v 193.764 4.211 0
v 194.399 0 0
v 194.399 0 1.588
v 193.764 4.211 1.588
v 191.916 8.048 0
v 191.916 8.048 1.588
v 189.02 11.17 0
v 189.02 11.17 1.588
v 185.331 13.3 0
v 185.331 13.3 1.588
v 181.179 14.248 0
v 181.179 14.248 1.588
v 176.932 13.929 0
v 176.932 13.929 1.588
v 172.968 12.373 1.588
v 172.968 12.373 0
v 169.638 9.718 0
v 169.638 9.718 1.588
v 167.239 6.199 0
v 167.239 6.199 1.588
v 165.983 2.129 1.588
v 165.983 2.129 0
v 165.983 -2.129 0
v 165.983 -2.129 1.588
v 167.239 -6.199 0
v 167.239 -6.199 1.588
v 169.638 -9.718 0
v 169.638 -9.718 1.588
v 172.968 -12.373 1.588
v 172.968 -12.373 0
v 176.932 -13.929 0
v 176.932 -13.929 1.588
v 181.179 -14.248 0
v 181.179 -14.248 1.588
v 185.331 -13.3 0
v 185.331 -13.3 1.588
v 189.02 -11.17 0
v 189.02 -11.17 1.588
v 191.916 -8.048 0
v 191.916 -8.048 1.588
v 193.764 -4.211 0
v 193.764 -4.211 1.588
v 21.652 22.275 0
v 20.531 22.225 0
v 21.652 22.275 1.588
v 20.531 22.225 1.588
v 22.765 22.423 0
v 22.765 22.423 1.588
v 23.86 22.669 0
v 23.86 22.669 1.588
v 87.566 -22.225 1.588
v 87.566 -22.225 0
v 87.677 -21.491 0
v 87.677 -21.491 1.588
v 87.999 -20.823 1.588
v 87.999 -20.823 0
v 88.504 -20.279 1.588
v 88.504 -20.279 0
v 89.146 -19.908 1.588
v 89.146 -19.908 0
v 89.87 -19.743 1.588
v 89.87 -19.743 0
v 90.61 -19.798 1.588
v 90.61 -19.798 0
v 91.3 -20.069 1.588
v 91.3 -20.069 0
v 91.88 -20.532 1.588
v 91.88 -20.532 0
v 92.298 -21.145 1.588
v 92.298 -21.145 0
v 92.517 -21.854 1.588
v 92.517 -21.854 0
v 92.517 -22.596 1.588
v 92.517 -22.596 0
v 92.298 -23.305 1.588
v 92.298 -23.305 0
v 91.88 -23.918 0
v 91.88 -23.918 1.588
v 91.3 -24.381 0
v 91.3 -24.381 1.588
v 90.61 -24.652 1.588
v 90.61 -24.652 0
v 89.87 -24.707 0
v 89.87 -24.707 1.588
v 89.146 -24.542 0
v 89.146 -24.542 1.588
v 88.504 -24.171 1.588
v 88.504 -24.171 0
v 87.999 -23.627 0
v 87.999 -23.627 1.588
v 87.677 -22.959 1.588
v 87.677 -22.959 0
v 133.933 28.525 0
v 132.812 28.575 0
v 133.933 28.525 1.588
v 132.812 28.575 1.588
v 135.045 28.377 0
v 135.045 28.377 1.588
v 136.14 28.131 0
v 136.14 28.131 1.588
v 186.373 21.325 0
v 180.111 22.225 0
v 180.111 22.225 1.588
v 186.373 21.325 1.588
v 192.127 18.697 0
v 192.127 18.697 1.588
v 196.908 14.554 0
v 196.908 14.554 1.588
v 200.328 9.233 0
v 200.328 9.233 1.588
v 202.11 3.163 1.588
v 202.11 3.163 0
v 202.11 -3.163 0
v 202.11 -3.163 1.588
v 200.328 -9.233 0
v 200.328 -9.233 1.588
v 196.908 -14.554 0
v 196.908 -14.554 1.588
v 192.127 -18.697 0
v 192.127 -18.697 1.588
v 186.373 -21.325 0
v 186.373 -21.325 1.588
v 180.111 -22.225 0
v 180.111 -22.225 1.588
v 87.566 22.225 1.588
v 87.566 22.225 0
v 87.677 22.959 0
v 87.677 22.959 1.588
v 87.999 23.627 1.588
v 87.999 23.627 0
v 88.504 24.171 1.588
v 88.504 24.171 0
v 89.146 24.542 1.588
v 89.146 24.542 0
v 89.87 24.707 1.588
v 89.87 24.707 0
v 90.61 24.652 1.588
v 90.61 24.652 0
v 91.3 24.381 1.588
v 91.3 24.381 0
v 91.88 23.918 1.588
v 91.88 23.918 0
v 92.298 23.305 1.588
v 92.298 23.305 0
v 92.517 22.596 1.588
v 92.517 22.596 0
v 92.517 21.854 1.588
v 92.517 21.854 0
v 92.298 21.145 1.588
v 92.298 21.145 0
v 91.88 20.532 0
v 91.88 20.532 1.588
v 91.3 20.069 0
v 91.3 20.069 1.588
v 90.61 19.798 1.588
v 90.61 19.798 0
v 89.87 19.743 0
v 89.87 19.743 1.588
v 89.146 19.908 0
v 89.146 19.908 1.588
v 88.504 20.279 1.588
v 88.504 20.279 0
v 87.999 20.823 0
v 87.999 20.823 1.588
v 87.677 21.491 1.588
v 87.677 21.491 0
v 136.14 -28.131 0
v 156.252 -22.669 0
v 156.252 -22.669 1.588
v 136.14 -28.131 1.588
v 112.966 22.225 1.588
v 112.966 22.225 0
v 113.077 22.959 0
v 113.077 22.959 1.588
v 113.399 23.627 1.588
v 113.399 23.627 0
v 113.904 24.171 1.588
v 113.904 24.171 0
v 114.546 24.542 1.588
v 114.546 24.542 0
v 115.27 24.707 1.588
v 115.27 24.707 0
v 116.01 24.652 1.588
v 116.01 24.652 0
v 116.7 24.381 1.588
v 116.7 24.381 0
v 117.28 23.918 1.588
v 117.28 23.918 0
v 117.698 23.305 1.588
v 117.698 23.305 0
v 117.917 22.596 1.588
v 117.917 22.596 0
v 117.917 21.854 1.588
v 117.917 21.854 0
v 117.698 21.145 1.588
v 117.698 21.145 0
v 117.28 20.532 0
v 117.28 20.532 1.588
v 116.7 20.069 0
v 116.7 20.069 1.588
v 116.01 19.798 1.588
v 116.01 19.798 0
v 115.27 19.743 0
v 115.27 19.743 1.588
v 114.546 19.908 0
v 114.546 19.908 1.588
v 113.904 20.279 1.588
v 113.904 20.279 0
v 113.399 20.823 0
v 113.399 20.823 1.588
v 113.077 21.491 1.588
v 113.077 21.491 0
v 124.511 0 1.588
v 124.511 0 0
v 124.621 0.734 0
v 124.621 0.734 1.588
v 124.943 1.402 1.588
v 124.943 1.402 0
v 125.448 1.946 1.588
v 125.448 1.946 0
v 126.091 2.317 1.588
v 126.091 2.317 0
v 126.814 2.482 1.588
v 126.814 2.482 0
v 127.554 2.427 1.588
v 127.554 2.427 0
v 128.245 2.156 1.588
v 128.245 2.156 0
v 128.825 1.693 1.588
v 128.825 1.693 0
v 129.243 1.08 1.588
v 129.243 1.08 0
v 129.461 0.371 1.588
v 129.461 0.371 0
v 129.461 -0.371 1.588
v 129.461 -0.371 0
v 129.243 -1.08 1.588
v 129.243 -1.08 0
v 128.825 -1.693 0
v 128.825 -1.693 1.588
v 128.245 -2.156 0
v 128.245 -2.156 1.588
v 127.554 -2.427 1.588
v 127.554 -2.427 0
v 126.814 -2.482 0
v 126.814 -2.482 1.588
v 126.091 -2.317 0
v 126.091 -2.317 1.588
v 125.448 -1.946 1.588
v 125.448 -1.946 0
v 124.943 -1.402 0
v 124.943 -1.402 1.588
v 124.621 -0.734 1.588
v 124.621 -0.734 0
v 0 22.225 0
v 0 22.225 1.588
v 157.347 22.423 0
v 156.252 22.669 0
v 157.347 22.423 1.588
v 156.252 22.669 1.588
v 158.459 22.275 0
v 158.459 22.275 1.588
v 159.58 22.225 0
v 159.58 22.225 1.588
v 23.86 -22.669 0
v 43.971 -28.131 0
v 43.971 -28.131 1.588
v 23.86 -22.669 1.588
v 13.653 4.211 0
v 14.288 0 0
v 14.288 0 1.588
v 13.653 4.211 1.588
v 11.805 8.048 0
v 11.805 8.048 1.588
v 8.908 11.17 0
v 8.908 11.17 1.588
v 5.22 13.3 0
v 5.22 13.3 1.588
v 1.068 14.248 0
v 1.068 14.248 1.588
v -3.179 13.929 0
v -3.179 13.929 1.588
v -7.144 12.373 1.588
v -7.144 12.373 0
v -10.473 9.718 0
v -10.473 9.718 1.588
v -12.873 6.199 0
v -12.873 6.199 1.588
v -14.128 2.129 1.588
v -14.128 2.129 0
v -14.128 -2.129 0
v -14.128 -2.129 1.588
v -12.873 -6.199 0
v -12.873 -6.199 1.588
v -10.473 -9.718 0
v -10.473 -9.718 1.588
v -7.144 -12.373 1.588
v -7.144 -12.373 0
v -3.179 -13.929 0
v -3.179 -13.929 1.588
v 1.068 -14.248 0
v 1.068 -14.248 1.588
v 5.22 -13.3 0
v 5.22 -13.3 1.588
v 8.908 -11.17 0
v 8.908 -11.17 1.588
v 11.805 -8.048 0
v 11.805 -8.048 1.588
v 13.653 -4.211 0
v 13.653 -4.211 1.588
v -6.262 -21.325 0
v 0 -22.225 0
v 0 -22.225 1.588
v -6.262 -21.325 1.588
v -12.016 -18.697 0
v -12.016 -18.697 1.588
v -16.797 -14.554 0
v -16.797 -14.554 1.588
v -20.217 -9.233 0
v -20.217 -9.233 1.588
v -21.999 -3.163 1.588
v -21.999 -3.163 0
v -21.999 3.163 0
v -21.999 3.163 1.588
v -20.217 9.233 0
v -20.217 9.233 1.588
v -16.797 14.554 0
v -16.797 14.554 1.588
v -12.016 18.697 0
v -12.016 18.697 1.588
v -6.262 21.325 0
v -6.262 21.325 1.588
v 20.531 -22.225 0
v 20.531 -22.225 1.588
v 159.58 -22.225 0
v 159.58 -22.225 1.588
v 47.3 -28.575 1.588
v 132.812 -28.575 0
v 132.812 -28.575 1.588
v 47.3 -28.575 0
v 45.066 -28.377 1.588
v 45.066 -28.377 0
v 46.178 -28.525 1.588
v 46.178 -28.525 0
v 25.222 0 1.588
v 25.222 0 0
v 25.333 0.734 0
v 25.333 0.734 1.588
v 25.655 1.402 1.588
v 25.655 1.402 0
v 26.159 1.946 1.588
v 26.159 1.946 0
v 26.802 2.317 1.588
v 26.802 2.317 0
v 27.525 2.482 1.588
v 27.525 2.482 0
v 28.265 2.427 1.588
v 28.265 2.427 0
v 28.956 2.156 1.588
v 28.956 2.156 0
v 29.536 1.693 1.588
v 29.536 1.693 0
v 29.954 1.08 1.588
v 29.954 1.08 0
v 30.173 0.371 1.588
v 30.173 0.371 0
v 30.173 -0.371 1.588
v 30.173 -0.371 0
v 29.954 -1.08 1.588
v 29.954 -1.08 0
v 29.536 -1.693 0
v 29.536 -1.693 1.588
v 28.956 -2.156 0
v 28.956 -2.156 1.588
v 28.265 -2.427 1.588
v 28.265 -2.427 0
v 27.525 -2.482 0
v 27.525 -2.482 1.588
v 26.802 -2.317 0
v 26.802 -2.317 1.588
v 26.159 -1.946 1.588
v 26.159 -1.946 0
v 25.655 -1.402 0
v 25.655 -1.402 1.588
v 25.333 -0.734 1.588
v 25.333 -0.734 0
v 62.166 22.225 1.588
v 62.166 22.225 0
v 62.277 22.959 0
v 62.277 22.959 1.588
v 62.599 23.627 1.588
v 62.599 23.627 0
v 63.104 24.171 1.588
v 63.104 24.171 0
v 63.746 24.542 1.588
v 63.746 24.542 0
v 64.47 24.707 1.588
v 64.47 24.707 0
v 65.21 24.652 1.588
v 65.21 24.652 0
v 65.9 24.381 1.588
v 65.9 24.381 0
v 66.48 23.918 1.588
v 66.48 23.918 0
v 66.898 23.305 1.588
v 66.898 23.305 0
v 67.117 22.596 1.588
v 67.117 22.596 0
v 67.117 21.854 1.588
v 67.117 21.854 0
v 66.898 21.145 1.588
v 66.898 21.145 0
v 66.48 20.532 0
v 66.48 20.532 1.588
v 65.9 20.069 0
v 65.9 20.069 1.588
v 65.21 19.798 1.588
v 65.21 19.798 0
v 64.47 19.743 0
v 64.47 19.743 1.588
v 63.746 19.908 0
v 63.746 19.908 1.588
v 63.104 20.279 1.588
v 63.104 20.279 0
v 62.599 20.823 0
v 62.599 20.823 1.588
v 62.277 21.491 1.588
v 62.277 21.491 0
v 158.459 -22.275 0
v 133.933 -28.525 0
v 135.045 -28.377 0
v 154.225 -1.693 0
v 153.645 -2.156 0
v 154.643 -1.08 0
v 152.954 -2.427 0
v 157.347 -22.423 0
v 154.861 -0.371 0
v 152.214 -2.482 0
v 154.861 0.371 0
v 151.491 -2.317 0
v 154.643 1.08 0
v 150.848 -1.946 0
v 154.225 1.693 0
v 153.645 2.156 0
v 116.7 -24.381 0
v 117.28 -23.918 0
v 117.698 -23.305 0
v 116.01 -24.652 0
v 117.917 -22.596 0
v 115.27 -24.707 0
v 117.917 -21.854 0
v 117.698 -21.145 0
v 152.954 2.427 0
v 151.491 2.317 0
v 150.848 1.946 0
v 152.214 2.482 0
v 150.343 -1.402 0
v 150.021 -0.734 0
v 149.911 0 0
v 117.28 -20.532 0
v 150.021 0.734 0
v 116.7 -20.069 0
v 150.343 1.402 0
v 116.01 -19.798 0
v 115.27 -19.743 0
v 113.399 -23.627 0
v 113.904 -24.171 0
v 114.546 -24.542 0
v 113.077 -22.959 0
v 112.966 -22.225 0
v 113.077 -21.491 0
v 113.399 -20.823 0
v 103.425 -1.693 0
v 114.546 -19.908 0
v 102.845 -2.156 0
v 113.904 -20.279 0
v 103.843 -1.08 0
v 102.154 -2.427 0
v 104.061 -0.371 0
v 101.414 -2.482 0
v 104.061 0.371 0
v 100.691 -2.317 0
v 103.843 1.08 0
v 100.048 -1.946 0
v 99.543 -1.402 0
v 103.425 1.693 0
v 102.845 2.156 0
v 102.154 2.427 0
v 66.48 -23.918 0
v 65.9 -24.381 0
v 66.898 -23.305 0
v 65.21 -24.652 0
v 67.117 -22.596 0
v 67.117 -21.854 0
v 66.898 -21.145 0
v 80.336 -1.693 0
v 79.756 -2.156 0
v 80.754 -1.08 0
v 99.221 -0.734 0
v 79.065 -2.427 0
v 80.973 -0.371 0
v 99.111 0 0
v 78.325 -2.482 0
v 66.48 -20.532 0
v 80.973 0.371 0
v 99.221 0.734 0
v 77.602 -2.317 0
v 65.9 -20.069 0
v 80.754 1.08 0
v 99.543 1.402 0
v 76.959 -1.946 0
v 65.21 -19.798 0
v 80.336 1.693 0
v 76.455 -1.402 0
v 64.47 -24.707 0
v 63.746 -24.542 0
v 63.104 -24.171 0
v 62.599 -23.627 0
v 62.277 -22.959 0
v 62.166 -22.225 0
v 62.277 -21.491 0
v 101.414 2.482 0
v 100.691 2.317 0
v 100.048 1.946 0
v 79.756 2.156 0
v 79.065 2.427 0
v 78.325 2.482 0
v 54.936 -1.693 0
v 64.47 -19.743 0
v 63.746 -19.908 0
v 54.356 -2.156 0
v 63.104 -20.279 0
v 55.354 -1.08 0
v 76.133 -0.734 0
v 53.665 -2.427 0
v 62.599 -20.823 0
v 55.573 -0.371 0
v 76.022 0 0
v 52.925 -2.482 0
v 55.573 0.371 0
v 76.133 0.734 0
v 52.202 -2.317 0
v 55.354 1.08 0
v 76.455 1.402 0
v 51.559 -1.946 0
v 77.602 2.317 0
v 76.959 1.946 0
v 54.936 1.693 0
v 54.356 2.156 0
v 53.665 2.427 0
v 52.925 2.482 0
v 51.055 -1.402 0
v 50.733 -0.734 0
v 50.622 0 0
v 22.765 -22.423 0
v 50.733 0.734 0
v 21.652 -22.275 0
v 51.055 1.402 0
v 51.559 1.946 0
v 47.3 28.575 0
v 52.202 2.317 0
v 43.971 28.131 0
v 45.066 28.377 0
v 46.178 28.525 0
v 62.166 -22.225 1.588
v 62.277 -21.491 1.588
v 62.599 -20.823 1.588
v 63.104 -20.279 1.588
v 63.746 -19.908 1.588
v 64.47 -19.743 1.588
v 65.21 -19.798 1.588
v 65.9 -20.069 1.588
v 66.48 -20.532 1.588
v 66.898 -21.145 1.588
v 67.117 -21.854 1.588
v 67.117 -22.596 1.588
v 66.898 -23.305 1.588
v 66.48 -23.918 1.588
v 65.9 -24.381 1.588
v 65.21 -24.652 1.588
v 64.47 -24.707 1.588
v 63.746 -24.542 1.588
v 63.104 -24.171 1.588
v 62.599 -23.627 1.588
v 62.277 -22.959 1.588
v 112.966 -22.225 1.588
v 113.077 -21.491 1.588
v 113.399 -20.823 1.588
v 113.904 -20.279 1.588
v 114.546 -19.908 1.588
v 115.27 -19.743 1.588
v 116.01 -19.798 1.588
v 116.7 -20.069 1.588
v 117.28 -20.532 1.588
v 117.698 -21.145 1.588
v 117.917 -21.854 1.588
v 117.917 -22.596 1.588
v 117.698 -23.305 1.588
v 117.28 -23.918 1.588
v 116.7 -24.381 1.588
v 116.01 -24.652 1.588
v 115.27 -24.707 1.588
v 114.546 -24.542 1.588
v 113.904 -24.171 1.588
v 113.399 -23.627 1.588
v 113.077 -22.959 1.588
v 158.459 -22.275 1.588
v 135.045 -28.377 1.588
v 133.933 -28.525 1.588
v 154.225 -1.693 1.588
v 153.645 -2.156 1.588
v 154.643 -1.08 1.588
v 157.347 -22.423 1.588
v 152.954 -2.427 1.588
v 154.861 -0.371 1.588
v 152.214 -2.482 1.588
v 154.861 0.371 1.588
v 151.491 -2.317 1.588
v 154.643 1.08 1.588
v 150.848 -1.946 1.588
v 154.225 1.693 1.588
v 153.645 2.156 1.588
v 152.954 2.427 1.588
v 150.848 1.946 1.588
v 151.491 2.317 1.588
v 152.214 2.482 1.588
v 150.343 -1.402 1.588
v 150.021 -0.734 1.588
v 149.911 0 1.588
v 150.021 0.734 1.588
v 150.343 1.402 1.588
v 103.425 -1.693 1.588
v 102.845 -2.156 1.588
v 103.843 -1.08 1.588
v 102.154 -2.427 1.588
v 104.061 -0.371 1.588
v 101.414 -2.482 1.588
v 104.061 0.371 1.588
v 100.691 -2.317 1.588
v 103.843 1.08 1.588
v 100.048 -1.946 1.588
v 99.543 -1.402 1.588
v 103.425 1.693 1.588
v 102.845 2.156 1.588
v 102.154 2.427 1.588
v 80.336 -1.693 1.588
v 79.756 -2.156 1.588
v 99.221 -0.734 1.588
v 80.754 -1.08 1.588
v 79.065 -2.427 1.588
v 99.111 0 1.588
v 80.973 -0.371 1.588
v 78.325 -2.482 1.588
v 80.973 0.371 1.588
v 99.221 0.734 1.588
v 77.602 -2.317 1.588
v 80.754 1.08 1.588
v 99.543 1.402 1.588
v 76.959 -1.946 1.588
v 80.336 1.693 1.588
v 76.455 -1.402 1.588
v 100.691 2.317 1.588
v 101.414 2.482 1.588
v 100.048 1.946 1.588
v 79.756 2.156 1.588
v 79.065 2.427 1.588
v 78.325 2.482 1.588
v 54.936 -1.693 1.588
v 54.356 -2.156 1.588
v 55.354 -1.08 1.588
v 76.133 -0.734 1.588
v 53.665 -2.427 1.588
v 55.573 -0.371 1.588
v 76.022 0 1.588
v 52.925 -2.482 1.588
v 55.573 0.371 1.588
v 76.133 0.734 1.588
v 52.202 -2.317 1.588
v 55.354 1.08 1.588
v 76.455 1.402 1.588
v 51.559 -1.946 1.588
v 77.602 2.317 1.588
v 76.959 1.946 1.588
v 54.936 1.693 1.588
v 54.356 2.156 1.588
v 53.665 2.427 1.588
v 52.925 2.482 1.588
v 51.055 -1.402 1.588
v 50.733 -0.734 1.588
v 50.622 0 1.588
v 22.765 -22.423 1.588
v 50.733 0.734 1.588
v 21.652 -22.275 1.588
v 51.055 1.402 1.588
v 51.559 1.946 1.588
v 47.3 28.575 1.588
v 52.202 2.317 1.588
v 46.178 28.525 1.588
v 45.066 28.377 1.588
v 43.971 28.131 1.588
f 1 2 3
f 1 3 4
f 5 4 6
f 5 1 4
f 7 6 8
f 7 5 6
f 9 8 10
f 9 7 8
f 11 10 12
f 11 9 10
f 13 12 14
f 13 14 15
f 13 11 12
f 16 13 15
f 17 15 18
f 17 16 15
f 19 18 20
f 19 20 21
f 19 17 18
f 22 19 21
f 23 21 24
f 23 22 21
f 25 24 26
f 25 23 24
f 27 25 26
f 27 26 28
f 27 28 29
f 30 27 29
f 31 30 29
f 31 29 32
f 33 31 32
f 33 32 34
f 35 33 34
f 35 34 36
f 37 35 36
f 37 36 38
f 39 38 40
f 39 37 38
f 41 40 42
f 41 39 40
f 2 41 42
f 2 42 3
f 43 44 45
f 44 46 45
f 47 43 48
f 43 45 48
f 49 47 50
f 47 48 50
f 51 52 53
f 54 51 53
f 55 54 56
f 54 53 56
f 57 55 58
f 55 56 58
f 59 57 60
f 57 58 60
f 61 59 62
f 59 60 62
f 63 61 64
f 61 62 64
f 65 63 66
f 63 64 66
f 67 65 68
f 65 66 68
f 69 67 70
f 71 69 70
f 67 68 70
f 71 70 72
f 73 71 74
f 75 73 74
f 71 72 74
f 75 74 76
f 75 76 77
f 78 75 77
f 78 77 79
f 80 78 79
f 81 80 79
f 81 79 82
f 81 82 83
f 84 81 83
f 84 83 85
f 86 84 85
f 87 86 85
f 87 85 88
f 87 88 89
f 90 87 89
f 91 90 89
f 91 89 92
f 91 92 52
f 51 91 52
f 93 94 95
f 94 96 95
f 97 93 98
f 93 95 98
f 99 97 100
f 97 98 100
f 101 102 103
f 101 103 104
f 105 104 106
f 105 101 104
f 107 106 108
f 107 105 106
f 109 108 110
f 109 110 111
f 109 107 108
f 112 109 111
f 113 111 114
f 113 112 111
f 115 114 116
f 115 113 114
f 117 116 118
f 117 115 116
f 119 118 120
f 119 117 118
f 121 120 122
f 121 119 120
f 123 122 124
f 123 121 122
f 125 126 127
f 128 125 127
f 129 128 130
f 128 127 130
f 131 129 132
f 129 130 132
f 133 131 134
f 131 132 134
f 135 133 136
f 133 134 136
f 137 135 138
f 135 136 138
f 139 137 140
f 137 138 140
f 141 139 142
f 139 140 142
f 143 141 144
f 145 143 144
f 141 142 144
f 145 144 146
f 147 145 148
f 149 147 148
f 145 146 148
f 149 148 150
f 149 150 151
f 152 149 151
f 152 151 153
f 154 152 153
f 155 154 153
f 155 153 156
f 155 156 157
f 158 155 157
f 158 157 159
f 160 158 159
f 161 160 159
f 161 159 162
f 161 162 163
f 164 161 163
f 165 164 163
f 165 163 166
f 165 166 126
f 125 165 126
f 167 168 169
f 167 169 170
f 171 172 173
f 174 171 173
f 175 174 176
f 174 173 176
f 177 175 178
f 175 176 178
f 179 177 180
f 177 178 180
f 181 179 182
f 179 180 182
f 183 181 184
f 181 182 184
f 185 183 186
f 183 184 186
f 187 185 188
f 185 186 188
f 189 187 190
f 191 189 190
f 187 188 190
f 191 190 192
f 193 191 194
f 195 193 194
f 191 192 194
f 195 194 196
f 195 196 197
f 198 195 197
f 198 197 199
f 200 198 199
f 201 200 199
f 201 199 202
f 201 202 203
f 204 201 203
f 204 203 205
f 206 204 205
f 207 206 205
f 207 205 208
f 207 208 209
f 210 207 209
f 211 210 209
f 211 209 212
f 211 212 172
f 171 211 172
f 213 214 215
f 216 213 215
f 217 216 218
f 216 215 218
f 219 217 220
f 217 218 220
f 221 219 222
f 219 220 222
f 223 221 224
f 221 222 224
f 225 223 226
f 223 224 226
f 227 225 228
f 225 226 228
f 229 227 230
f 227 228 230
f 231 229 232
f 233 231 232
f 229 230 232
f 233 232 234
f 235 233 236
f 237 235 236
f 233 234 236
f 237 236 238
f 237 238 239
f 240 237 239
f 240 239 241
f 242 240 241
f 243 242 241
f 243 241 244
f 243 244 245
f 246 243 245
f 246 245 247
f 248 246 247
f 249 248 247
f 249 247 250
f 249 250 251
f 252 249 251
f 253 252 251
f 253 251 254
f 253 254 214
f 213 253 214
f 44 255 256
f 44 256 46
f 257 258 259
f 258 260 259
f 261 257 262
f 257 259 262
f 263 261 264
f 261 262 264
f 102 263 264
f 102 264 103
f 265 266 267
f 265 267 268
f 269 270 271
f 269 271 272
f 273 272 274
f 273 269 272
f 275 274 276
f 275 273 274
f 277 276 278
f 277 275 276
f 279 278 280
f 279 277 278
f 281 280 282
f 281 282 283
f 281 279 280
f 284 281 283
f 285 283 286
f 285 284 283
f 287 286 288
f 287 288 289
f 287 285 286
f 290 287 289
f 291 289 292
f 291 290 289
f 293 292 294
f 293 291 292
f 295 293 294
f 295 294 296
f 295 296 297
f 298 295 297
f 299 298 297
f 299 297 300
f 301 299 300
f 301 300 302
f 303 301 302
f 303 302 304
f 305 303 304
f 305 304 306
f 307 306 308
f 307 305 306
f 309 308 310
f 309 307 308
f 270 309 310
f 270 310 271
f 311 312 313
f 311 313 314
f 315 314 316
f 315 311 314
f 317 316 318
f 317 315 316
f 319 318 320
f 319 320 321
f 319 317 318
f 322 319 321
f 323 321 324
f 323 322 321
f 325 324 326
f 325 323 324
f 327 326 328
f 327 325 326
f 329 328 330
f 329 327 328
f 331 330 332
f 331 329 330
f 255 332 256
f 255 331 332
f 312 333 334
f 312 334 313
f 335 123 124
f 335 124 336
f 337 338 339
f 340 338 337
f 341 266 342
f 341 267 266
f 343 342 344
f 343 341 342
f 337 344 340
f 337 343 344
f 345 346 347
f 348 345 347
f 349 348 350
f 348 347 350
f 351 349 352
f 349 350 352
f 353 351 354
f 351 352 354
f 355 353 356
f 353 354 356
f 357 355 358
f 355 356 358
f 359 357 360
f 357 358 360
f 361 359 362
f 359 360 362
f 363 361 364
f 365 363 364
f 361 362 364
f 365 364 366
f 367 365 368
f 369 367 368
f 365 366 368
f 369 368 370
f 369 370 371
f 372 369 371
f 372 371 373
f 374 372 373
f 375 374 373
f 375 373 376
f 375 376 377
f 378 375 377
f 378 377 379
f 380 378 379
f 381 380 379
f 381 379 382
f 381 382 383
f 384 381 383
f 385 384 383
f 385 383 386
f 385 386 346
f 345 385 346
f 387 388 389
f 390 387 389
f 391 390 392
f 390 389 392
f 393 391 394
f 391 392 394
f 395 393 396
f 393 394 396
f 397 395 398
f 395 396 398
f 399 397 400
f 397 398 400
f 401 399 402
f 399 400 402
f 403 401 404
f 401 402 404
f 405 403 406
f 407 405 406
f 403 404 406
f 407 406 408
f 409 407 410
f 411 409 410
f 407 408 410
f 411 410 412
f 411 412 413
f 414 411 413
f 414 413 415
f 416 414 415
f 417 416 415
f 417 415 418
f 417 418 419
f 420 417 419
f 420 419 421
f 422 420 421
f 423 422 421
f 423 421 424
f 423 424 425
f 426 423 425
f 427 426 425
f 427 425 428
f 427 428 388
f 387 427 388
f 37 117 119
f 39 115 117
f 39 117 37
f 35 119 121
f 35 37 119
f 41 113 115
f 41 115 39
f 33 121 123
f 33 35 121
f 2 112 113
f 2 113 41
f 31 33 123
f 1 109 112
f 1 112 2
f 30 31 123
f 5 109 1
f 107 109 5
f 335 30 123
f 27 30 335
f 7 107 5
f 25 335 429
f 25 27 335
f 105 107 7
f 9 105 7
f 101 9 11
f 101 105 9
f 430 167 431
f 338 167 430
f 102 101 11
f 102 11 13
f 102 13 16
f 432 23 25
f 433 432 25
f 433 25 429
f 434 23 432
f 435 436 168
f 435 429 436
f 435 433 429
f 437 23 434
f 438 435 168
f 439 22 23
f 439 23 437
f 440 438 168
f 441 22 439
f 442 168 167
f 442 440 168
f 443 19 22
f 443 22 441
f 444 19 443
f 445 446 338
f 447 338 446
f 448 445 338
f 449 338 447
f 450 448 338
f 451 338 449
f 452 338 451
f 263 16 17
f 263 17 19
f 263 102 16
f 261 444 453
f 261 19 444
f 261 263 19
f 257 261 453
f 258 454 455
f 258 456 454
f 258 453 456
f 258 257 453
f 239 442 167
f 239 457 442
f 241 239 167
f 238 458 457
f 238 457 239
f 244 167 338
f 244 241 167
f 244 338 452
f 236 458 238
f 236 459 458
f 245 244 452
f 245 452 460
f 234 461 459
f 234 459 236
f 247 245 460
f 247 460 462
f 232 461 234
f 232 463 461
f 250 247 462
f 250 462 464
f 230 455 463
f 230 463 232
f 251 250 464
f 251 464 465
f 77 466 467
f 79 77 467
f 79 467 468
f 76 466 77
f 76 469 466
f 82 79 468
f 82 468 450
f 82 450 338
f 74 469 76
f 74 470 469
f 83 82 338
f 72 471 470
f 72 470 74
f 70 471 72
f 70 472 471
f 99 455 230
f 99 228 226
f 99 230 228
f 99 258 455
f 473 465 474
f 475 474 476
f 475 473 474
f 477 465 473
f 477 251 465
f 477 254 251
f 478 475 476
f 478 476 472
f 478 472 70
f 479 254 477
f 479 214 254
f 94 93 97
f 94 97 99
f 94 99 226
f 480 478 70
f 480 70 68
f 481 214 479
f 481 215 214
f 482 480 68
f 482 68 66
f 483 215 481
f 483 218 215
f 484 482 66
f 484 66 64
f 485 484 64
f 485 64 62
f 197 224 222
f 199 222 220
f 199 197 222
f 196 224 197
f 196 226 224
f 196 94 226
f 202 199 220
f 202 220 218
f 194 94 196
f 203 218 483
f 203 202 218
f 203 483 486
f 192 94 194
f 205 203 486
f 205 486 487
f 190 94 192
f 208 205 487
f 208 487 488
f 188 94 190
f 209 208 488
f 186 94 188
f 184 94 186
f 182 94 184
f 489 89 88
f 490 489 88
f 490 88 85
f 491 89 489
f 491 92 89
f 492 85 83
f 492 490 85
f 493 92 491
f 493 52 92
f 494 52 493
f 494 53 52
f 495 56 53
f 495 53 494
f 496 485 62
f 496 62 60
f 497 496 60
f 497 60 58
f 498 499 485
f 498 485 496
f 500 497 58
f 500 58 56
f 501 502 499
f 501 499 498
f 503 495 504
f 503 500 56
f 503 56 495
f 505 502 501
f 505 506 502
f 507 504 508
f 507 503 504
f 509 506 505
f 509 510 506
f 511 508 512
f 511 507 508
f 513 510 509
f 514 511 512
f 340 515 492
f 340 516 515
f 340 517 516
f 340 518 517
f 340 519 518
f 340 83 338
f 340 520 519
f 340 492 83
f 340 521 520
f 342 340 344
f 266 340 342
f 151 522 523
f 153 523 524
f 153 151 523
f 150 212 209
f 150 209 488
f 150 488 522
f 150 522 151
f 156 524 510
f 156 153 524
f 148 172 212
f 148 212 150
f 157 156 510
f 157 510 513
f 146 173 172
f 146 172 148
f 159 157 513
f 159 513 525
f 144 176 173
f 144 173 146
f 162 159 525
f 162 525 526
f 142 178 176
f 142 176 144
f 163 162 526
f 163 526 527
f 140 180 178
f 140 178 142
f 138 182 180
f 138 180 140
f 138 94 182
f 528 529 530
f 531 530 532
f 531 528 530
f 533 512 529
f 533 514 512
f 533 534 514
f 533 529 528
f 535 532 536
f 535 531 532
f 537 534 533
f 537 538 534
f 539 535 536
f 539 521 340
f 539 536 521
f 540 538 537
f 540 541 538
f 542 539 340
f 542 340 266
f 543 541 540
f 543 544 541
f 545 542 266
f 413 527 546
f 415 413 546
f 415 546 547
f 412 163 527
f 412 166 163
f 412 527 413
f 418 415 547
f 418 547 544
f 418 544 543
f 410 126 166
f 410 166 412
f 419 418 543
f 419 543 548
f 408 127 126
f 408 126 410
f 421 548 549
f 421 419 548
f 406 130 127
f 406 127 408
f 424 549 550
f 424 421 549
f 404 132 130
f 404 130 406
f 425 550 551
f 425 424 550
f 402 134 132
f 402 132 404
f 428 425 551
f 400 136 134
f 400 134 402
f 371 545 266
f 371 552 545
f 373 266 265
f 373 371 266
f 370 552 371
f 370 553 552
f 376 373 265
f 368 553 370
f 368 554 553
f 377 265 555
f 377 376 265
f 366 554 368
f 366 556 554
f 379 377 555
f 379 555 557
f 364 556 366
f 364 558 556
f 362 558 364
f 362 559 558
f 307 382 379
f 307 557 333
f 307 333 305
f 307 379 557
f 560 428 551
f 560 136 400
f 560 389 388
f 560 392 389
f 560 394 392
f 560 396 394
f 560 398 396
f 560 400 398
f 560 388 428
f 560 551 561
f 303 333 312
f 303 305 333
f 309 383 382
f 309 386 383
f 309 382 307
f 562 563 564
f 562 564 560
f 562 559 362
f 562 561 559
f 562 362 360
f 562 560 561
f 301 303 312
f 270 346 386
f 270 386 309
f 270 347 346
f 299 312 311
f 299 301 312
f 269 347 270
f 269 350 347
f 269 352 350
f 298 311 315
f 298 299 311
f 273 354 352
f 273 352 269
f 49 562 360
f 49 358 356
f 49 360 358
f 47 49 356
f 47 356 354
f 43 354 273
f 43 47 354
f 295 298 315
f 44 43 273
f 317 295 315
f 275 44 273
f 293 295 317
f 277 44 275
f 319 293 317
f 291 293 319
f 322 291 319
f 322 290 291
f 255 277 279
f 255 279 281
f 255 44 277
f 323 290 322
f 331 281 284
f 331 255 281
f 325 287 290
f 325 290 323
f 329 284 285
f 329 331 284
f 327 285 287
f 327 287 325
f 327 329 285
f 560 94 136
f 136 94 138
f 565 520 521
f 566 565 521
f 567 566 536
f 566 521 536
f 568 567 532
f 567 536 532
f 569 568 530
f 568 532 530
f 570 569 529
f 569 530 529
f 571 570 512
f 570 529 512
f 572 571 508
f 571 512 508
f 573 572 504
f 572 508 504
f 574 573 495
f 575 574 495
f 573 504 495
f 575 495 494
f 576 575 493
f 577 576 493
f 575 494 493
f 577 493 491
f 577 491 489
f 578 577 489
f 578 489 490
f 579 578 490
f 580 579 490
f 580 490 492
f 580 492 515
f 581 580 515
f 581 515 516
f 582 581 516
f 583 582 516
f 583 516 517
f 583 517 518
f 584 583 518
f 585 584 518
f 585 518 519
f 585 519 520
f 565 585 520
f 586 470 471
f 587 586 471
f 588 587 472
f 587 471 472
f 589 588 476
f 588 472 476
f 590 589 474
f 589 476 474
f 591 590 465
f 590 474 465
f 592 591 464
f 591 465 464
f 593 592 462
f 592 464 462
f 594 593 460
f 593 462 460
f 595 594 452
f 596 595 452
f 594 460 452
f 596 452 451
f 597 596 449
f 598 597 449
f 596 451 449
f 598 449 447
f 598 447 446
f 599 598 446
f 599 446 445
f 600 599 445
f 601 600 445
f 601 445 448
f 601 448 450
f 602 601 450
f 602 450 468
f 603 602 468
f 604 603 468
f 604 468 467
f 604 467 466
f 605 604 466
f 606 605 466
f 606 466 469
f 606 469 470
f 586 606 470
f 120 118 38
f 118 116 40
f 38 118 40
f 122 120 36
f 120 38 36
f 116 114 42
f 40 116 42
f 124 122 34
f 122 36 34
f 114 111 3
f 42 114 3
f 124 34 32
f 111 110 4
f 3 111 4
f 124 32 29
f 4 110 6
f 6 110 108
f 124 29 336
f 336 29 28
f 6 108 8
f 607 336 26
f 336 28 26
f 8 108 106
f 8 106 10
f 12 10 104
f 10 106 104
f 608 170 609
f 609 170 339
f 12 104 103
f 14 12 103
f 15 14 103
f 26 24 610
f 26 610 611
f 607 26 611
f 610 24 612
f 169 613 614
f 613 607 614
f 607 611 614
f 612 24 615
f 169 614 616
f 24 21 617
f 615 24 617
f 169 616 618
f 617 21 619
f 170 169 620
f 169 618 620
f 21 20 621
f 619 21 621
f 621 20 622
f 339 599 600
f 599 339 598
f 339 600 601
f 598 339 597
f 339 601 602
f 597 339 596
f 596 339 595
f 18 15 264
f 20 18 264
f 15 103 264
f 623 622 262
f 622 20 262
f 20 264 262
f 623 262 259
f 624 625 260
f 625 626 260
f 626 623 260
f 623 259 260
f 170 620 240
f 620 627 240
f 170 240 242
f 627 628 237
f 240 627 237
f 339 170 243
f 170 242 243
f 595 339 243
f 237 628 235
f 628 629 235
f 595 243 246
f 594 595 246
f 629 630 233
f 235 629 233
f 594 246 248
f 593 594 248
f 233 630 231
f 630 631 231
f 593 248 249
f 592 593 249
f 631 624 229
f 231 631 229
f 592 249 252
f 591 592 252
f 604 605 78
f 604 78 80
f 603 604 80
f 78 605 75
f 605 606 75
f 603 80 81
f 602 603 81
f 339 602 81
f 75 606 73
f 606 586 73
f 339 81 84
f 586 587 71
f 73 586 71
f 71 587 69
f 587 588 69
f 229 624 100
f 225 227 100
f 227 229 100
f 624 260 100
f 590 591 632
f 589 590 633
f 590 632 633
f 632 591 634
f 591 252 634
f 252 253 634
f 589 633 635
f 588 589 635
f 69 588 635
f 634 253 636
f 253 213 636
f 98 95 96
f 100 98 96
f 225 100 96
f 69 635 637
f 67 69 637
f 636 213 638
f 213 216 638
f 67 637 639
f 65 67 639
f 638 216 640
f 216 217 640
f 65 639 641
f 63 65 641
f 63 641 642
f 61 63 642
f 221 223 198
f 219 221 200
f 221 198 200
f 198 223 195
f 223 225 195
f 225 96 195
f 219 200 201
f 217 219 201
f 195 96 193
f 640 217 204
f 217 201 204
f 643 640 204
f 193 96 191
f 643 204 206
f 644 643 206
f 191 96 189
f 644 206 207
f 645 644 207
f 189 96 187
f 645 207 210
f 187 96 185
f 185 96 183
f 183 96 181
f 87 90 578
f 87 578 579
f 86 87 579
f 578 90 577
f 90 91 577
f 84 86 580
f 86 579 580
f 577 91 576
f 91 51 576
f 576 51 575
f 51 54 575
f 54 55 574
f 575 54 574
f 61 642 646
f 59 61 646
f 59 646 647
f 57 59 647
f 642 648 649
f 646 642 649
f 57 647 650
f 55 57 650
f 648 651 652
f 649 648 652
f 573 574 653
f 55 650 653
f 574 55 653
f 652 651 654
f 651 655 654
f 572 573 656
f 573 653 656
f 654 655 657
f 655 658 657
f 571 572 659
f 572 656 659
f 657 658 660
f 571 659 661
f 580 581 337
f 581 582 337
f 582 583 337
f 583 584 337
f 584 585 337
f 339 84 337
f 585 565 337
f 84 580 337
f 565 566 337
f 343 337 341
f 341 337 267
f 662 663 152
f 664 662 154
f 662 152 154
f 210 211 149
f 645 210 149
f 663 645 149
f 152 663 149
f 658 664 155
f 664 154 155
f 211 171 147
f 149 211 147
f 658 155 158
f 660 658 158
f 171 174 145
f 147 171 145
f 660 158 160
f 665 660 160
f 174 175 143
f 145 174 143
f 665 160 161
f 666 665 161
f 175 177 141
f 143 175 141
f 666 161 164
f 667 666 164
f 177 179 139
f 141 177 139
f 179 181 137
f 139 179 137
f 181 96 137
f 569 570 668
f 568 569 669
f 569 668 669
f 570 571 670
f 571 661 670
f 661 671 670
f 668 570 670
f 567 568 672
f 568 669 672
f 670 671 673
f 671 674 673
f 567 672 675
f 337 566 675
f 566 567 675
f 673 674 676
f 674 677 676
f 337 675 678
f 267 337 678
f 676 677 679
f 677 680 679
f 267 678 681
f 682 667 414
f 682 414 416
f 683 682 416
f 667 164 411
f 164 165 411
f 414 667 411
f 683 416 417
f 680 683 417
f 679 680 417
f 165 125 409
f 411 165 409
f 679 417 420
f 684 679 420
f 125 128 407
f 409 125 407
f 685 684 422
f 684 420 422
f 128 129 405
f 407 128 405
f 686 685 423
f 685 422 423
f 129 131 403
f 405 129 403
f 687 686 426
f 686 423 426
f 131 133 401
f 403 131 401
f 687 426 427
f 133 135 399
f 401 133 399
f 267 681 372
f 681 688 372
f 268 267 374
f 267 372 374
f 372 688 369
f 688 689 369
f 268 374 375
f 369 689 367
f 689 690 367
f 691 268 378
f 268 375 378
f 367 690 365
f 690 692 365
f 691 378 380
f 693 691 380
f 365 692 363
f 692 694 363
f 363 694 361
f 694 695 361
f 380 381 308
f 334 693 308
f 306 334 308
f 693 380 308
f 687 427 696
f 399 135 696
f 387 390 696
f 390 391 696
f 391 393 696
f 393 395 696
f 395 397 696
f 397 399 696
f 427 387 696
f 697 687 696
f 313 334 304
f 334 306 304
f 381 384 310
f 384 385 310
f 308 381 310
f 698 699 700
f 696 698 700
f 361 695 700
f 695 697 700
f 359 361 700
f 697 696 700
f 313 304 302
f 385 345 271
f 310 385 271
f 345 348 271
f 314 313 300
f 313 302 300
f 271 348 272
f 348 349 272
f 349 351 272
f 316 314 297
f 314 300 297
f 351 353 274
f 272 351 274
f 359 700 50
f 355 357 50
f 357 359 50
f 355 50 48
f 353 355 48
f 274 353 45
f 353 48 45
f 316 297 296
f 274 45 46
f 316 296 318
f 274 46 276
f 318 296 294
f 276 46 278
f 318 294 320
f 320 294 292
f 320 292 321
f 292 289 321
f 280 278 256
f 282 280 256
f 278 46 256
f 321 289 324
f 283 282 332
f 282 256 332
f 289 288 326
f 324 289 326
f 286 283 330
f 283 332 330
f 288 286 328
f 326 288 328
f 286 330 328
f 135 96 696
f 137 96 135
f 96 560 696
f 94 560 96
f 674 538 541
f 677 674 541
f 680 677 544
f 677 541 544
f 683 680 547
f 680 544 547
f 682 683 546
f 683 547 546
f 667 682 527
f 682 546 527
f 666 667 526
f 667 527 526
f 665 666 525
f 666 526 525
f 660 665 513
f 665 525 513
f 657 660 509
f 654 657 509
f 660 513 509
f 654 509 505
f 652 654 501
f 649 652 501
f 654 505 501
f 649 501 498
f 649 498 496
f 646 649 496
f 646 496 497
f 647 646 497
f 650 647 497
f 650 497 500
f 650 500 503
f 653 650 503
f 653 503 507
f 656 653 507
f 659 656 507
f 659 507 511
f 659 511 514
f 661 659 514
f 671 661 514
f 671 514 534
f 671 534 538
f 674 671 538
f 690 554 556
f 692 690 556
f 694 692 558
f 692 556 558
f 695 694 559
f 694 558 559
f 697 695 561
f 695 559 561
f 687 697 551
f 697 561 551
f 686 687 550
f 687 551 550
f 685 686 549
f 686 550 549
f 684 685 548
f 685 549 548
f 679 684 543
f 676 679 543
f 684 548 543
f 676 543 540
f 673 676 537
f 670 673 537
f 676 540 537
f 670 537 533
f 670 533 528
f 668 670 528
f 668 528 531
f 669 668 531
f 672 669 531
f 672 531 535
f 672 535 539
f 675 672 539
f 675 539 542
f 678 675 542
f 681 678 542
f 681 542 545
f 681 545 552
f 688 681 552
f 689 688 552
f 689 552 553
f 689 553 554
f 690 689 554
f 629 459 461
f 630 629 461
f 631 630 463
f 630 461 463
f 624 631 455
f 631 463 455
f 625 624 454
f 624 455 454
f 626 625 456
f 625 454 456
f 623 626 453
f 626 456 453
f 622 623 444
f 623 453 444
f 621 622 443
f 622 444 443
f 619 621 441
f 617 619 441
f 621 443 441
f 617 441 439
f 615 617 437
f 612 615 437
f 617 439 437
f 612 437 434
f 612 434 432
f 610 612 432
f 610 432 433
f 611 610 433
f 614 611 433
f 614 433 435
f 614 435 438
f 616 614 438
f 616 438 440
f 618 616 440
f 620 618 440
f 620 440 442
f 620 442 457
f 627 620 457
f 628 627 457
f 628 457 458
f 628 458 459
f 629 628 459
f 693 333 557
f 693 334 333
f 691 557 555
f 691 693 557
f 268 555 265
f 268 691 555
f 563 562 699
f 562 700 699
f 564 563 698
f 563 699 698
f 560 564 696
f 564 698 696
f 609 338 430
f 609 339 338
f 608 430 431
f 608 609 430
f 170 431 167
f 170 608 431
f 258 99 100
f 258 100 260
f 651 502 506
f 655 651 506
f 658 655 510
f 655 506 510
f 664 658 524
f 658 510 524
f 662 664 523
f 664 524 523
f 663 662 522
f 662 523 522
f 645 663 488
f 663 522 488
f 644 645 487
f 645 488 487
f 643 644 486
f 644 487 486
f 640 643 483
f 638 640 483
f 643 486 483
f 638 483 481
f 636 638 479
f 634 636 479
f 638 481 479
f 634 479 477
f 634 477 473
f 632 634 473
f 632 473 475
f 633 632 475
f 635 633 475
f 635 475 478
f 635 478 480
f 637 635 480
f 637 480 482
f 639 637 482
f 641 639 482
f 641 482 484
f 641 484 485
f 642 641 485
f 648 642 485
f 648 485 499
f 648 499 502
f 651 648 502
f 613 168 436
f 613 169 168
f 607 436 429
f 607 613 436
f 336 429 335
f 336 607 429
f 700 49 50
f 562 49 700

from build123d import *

# Parameters (mm, degrees)
SKETCH1_R              = 14.2875
BOSS_EXTRUDE1_DEPTH    = 1.5875
F_10_CLEARANCE_HOLE1_D = 4.9784
FILLET1_R              = 12.7


with BuildPart() as part:
    # Sketch1 → Boss-Extrude1 (new body)
    with BuildSketch(Plane.XY):
        with BuildLine():
            Line((0, 22.225), (22.225, 22.225))
            Line((22.225, 22.225), (45.6057, 28.575))
            Line((45.6057, 28.575), (134.5057, 28.575))
            Line((134.5057, 28.575), (157.8864, 22.225))
            Line((157.8864, 22.225), (180.1114, 22.225))
            ThreePointArc((180.1114, 22.225), (202.3364, 0), (180.1114, -22.225))
            Line((180.1114, -22.225), (157.8864, -22.225))
            Line((157.8864, -22.225), (134.5057, -28.575))
            Line((134.5057, -28.575), (45.6057, -28.575))
            Line((45.6057, -28.575), (22.225, -22.225))
            Line((22.225, -22.225), (0, -22.225))
            ThreePointArc((0, -22.225), (-22.225, 0), (0, 22.225))
        make_face()
        Circle(SKETCH1_R, mode=Mode.SUBTRACT)
        with Locations((180.1114, 0)):
            Circle(SKETCH1_R, mode=Mode.SUBTRACT)
    extrude(amount=BOSS_EXTRUDE1_DEPTH)

    # #10 Clearance Hole1 (through all)
    with Locations(Plane.XY.offset(1.5875)):
        with Locations((64.6557, -22.225), (27.7114, 0), (64.6557, 22.225), (90.0557, 22.225), (53.1114, 0), (78.5114, 0), (101.6, 0), (127, 0), (115.4557, 22.225), (152.4, 0), (115.4557, -22.225), (90.0557, -22.225)):
            Hole(F_10_CLEARANCE_HOLE1_D / 2)

    # Fillet1
    fillet1_edges = [part.edges().sort_by_distance(p)[0] for p in [
        (22.225, 22.225, 0.79375),
        (45.6057, 28.575, 0.79375),
        (134.5057, 28.575, 0.79375),
        (157.8864, 22.225, 0.79375),
        (157.8864, -22.225, 0.79375),
        (134.5057, -28.575, 0.79375),
        (45.6057, -28.575, 0.79375),
        (22.225, -22.225, 0.79375),
    ]]
    fillet(fillet1_edges, radius=FILLET1_R)


solid = part.part
